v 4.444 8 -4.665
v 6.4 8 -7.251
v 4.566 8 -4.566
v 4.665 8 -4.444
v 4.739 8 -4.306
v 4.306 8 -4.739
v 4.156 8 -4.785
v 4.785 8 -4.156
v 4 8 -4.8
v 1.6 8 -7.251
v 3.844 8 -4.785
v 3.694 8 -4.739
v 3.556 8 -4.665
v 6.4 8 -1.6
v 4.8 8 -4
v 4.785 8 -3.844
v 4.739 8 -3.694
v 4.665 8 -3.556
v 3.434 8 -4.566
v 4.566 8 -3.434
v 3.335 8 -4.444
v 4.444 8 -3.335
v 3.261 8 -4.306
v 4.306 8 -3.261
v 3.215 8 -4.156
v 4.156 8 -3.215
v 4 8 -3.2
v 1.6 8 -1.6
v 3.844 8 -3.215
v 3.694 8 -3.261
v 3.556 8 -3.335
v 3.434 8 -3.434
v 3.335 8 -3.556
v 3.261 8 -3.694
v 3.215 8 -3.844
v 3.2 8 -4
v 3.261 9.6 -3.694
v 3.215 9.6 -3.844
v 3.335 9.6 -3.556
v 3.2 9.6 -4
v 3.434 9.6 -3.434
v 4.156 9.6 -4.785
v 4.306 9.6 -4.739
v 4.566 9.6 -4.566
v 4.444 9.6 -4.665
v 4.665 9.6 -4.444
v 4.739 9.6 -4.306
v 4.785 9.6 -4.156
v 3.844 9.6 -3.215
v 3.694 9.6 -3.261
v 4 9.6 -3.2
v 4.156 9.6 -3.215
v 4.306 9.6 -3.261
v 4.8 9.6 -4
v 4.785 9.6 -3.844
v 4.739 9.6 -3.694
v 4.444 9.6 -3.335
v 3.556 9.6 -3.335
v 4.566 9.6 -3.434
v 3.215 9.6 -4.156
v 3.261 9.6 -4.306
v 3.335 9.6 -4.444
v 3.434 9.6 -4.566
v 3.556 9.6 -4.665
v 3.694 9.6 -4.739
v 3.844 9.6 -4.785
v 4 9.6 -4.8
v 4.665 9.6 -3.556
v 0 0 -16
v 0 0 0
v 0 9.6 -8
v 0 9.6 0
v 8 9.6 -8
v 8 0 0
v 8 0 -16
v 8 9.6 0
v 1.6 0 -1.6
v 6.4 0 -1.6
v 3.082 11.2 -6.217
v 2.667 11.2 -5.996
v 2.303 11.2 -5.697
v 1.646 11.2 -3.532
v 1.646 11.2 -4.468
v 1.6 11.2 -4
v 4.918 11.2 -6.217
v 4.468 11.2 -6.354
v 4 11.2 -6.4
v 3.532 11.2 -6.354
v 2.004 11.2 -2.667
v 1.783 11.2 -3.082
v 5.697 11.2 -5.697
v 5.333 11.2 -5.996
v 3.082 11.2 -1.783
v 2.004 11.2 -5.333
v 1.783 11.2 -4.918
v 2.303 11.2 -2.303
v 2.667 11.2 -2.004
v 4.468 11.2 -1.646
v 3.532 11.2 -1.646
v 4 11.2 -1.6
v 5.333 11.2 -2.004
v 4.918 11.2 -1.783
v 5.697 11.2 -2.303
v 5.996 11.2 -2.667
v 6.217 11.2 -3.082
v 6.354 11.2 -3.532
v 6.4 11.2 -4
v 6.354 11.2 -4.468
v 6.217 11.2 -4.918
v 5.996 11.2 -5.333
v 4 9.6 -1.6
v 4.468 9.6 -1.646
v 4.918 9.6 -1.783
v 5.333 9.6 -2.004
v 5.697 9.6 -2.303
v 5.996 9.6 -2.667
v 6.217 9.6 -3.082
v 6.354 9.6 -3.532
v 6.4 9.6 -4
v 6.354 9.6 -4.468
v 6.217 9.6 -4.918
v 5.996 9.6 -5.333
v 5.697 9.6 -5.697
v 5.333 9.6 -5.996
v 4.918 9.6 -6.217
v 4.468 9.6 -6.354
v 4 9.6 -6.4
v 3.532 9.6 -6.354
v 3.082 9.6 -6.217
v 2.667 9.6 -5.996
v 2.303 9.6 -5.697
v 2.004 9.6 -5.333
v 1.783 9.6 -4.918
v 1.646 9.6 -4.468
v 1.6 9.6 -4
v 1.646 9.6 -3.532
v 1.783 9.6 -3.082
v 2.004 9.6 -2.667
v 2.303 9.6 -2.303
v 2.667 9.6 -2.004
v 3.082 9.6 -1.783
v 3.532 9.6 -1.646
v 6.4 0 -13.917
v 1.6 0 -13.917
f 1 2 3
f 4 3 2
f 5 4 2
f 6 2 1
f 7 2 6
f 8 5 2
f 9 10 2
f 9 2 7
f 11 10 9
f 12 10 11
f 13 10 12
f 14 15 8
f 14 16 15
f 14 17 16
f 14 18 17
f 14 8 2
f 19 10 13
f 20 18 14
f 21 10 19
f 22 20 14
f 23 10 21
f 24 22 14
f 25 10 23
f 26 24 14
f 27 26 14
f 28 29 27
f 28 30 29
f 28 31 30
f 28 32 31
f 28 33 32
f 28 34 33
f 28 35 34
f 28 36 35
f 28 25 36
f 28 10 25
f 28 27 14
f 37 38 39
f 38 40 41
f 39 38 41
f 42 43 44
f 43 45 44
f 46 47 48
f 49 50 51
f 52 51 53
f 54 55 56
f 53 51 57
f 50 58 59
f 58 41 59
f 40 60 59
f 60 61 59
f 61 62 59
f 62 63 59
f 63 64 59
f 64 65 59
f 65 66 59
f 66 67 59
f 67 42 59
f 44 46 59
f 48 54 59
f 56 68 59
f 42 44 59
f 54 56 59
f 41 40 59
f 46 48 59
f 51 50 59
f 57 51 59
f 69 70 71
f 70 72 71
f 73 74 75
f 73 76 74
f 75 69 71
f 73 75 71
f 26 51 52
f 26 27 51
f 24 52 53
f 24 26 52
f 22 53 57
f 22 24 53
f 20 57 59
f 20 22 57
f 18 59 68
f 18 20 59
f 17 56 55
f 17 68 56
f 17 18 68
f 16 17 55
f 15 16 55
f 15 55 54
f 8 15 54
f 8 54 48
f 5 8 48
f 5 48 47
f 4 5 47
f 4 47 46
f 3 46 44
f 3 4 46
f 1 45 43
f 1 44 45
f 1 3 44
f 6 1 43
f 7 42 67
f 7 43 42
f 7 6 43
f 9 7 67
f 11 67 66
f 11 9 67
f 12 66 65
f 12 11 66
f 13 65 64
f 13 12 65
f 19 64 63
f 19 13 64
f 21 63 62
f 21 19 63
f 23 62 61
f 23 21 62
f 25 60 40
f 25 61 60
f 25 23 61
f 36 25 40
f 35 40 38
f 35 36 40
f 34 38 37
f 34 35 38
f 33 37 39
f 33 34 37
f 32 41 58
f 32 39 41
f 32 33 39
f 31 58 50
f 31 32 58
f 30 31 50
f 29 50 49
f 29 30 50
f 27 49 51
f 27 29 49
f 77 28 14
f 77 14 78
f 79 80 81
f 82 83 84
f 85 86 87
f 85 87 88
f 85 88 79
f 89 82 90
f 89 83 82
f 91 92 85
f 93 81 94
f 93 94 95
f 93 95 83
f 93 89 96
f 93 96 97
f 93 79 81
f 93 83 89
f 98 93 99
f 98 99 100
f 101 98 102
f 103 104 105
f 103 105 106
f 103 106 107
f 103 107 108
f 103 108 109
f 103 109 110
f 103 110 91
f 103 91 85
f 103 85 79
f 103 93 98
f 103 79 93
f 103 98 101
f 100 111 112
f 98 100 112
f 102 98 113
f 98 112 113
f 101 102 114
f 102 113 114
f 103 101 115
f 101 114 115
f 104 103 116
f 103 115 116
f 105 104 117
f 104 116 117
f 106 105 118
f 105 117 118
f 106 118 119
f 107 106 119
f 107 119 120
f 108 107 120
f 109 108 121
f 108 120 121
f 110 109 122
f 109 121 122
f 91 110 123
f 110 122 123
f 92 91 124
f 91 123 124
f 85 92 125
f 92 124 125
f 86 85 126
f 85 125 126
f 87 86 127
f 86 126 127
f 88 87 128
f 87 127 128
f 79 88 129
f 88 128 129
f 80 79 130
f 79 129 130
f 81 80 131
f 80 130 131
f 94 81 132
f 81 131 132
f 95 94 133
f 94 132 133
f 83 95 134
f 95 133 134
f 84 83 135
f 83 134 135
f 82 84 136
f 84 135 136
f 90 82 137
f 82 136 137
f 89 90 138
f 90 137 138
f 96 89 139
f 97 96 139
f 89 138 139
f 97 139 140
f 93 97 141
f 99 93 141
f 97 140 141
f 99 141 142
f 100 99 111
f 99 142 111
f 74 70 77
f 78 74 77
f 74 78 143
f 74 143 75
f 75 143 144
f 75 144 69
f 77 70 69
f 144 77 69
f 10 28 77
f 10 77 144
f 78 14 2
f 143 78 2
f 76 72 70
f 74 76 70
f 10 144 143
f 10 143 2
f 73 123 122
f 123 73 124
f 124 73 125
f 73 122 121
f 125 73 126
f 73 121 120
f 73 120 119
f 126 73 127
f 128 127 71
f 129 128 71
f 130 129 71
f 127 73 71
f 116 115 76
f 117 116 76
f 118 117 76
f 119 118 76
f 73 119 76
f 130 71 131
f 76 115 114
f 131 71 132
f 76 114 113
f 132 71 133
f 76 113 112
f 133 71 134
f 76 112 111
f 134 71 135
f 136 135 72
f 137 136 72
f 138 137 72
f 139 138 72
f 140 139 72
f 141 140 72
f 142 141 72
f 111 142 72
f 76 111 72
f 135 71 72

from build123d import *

# Parameters (mm, degrees)
BOSS_EXTRUDE1_DEPTH = 8
SKETCH2_R           = 2.4
BOSS_EXTRUDE2_DEPTH = 1.6
SHELL1_T            = -1.6


with BuildPart() as part:
    # Sketch1 → Boss-Extrude1 (new body)
    with BuildSketch(Plane(origin=(0, 0, 0), x_dir=(0, 0, -1), z_dir=(1, 0, 0))):
        Polygon((0, 0), (16, 0), (8, 9.6), (0, 9.6), align=None)
    extrude(amount=BOSS_EXTRUDE1_DEPTH)

    # Sketch2 → Boss-Extrude2 (add)
    with BuildSketch(Plane(origin=(0, 9.6, 0), x_dir=(1, 0, 0), z_dir=(0, 1, 0))):
        with Locations(Location((4, 4, 0), (0, 0, 270))):
            Circle(SKETCH2_R)
    extrude(amount=BOSS_EXTRUDE2_DEPTH)

    # Shell1
    shell1_openings = [part.faces().sort_by_distance(p)[0] for p in [
        (4, 0, -8),
    ]]
    offset(amount=SHELL1_T, openings=shell1_openings, kind=Kind.INTERSECTION)


solid = part.part
